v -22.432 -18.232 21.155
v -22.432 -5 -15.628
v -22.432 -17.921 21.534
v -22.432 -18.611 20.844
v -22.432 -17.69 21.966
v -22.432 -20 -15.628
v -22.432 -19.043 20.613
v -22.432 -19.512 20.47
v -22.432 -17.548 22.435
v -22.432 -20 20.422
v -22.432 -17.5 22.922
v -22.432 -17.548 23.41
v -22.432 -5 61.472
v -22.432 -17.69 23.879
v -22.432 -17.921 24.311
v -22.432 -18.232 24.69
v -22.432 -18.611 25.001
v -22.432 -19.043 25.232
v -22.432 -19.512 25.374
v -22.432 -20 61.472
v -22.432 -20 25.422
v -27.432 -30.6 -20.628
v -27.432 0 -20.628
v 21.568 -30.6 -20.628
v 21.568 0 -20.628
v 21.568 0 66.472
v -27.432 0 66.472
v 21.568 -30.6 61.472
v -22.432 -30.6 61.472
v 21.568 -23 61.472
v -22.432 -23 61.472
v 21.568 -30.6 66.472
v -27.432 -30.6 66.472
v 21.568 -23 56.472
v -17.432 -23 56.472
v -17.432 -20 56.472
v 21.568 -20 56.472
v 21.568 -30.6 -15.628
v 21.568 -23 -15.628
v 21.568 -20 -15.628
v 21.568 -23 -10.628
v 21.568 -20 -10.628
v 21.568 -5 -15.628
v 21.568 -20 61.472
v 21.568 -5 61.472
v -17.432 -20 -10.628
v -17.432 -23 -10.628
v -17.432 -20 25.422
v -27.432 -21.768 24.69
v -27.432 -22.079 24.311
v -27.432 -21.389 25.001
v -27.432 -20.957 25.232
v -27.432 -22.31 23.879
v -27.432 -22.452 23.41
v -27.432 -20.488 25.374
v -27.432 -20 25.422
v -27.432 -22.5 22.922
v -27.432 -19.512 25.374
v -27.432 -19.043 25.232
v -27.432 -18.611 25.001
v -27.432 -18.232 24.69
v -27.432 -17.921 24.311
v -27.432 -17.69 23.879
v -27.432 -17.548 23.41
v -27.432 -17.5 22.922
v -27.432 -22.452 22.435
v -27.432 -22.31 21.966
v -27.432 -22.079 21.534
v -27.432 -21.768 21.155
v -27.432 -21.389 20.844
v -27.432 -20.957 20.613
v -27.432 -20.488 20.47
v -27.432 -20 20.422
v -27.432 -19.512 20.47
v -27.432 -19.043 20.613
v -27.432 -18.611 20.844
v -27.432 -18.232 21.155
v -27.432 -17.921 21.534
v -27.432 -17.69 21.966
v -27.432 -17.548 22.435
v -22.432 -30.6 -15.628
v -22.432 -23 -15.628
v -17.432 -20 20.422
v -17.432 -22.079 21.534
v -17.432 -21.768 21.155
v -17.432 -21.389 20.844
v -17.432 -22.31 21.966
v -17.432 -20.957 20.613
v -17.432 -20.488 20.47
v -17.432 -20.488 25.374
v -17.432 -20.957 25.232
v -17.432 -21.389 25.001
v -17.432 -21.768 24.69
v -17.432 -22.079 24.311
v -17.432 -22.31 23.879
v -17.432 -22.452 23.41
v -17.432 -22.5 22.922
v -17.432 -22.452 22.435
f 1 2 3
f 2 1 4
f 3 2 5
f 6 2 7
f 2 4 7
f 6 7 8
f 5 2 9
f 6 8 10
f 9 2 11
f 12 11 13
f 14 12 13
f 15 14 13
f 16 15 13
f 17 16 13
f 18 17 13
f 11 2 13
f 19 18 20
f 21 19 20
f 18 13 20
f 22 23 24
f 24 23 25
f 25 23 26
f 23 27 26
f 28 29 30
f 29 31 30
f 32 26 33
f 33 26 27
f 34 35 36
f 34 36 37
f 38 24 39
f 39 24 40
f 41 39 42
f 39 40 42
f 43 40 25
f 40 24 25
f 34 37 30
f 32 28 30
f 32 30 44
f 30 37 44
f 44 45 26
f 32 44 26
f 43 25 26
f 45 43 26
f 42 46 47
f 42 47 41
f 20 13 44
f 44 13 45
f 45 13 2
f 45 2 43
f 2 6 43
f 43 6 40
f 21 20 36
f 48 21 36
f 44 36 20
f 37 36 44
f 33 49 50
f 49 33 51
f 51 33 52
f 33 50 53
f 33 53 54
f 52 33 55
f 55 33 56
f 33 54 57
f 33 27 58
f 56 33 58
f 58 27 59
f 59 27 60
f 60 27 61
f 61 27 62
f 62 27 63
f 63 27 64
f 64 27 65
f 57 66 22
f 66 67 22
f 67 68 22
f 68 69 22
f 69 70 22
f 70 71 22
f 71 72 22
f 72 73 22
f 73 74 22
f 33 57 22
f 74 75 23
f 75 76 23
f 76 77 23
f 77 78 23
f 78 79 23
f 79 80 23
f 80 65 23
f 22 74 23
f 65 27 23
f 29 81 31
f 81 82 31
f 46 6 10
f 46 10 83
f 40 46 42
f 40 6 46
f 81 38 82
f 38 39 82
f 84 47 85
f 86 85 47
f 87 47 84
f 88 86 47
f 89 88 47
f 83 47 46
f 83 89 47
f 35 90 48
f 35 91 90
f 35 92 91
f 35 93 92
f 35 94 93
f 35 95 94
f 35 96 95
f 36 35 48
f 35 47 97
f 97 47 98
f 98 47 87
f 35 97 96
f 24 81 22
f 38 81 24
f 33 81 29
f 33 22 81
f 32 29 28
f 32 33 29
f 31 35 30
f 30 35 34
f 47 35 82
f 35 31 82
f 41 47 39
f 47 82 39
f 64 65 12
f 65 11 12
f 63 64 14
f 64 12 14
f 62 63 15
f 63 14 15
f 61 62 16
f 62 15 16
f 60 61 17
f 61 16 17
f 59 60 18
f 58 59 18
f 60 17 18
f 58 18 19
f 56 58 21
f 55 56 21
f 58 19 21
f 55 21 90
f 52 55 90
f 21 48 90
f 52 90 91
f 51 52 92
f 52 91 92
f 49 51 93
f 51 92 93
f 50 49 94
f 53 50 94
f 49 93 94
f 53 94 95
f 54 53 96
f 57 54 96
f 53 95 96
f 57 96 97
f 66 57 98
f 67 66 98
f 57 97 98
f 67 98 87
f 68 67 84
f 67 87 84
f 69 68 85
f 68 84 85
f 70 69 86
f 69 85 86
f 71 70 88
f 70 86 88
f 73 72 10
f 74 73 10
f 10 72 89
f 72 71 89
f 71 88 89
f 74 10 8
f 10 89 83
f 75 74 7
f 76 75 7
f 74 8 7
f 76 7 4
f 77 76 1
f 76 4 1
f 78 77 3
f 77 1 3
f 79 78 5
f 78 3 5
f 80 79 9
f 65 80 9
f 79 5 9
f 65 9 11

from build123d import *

# Parameters (mm, degrees)
F0_W      = 44
F0_H      = 77.1
F1_DEPTH  = 5
F2_W      = 27.6
F2_H      = 77.1
F3_DEPTH  = 5
F4_W      = 49
F4_H      = 27.6
F5_DEPTH  = 5
F6_W      = 49
F6_H      = 27.6
F7_DEPTH  = 5
F8_W      = 44
F8_H      = 3
F9_DEPTH  = 5
F10_W     = 3
F10_H     = 72.1
F11_DEPTH = 5
F12_W     = 39
F12_H     = 3
F13_DEPTH = 5
F14_W     = 44
F14_H     = 5
F15_DEPTH = 3
F16_R     = 2.5
F17_DEPTH = 12.7


with BuildPart() as f1:
    # F0 (on Front) → F1 (new body)
    with BuildSketch(Plane.XZ):
        with Locations((-0.431709, 22.922463)):
            Rectangle(F0_W, F0_H)
    extrude(amount=F1_DEPTH)

    # F2 (on face) → F3 (join)
    with BuildSketch(Plane(origin=(-22.431709, 0, 0), x_dir=(0, -1, 0), z_dir=(-1, 0, 0))):
        with Locations((13.8, 22.922463)):
            Rectangle(F2_W, F2_H)
    extrude(amount=F3_DEPTH)

    # F4 (on face) → F5 (join)
    with BuildSketch(Plane.XY.offset(61.472463)):
        with Locations((-2.931709, -13.8)):
            Rectangle(F4_W, F4_H)
    extrude(amount=F5_DEPTH)

    # F6 (on face) → F7 (join)
    with BuildSketch(Plane(origin=(0, 0, -15.627537), x_dir=(1, 0, 0), z_dir=(0, 0, -1))):
        with Locations((-2.931709, 13.8)):
            Rectangle(F6_W, F6_H)
    extrude(amount=F7_DEPTH)

    # F8 (on face) → F9 (join)
    with BuildSketch(Plane(origin=(0, 0, 61.472463), x_dir=(1, 0, 0), z_dir=(0, 0, -1))):
        with Locations((-0.431709, 21.5)):
            Rectangle(F8_W, F8_H)
    extrude(amount=F9_DEPTH)

    # F10 (on face) → F11 (join)
    with BuildSketch(Plane.YZ.offset(-22.431709)):
        with Locations((-21.5, 20.422463)):
            Rectangle(F10_W, F10_H)
    extrude(amount=F11_DEPTH)

    # F12 (on face) → F13 (join)
    with BuildSketch(Plane.XY.offset(-15.627537)):
        with Locations((2.068291, -21.5)):
            Rectangle(F12_W, F12_H)
    extrude(amount=F13_DEPTH)

    # F14 (on face) → F15 (join)
    with BuildSketch(Plane.XZ.offset(27.6)):
        Polygon((-27.431709, -20.627537), (21.568291, -20.627537), (21.568291, -15.627537), (-22.431709, -15.627537), (-27.431709, -15.627537), align=None)
        Polygon((-27.431709, 66.472463), (-27.431709, -15.627537), (-22.431709, -15.627537), (-22.431709, 61.472463), (-22.431709, 66.472463), align=None)
        with Locations((-0.431709, 63.972463)):
            Rectangle(F14_W, F14_H)
    extrude(amount=F15_DEPTH)

    # F16 (on face) → F17 (cut, symmetric)
    with BuildSketch(Plane.YZ.offset(-22.431709)):
        with Locations((-20, 22.922463)):
            Circle(F16_R)
    extrude(amount=F17_DEPTH, both=True, mode=Mode.SUBTRACT)


solid = f1.part
